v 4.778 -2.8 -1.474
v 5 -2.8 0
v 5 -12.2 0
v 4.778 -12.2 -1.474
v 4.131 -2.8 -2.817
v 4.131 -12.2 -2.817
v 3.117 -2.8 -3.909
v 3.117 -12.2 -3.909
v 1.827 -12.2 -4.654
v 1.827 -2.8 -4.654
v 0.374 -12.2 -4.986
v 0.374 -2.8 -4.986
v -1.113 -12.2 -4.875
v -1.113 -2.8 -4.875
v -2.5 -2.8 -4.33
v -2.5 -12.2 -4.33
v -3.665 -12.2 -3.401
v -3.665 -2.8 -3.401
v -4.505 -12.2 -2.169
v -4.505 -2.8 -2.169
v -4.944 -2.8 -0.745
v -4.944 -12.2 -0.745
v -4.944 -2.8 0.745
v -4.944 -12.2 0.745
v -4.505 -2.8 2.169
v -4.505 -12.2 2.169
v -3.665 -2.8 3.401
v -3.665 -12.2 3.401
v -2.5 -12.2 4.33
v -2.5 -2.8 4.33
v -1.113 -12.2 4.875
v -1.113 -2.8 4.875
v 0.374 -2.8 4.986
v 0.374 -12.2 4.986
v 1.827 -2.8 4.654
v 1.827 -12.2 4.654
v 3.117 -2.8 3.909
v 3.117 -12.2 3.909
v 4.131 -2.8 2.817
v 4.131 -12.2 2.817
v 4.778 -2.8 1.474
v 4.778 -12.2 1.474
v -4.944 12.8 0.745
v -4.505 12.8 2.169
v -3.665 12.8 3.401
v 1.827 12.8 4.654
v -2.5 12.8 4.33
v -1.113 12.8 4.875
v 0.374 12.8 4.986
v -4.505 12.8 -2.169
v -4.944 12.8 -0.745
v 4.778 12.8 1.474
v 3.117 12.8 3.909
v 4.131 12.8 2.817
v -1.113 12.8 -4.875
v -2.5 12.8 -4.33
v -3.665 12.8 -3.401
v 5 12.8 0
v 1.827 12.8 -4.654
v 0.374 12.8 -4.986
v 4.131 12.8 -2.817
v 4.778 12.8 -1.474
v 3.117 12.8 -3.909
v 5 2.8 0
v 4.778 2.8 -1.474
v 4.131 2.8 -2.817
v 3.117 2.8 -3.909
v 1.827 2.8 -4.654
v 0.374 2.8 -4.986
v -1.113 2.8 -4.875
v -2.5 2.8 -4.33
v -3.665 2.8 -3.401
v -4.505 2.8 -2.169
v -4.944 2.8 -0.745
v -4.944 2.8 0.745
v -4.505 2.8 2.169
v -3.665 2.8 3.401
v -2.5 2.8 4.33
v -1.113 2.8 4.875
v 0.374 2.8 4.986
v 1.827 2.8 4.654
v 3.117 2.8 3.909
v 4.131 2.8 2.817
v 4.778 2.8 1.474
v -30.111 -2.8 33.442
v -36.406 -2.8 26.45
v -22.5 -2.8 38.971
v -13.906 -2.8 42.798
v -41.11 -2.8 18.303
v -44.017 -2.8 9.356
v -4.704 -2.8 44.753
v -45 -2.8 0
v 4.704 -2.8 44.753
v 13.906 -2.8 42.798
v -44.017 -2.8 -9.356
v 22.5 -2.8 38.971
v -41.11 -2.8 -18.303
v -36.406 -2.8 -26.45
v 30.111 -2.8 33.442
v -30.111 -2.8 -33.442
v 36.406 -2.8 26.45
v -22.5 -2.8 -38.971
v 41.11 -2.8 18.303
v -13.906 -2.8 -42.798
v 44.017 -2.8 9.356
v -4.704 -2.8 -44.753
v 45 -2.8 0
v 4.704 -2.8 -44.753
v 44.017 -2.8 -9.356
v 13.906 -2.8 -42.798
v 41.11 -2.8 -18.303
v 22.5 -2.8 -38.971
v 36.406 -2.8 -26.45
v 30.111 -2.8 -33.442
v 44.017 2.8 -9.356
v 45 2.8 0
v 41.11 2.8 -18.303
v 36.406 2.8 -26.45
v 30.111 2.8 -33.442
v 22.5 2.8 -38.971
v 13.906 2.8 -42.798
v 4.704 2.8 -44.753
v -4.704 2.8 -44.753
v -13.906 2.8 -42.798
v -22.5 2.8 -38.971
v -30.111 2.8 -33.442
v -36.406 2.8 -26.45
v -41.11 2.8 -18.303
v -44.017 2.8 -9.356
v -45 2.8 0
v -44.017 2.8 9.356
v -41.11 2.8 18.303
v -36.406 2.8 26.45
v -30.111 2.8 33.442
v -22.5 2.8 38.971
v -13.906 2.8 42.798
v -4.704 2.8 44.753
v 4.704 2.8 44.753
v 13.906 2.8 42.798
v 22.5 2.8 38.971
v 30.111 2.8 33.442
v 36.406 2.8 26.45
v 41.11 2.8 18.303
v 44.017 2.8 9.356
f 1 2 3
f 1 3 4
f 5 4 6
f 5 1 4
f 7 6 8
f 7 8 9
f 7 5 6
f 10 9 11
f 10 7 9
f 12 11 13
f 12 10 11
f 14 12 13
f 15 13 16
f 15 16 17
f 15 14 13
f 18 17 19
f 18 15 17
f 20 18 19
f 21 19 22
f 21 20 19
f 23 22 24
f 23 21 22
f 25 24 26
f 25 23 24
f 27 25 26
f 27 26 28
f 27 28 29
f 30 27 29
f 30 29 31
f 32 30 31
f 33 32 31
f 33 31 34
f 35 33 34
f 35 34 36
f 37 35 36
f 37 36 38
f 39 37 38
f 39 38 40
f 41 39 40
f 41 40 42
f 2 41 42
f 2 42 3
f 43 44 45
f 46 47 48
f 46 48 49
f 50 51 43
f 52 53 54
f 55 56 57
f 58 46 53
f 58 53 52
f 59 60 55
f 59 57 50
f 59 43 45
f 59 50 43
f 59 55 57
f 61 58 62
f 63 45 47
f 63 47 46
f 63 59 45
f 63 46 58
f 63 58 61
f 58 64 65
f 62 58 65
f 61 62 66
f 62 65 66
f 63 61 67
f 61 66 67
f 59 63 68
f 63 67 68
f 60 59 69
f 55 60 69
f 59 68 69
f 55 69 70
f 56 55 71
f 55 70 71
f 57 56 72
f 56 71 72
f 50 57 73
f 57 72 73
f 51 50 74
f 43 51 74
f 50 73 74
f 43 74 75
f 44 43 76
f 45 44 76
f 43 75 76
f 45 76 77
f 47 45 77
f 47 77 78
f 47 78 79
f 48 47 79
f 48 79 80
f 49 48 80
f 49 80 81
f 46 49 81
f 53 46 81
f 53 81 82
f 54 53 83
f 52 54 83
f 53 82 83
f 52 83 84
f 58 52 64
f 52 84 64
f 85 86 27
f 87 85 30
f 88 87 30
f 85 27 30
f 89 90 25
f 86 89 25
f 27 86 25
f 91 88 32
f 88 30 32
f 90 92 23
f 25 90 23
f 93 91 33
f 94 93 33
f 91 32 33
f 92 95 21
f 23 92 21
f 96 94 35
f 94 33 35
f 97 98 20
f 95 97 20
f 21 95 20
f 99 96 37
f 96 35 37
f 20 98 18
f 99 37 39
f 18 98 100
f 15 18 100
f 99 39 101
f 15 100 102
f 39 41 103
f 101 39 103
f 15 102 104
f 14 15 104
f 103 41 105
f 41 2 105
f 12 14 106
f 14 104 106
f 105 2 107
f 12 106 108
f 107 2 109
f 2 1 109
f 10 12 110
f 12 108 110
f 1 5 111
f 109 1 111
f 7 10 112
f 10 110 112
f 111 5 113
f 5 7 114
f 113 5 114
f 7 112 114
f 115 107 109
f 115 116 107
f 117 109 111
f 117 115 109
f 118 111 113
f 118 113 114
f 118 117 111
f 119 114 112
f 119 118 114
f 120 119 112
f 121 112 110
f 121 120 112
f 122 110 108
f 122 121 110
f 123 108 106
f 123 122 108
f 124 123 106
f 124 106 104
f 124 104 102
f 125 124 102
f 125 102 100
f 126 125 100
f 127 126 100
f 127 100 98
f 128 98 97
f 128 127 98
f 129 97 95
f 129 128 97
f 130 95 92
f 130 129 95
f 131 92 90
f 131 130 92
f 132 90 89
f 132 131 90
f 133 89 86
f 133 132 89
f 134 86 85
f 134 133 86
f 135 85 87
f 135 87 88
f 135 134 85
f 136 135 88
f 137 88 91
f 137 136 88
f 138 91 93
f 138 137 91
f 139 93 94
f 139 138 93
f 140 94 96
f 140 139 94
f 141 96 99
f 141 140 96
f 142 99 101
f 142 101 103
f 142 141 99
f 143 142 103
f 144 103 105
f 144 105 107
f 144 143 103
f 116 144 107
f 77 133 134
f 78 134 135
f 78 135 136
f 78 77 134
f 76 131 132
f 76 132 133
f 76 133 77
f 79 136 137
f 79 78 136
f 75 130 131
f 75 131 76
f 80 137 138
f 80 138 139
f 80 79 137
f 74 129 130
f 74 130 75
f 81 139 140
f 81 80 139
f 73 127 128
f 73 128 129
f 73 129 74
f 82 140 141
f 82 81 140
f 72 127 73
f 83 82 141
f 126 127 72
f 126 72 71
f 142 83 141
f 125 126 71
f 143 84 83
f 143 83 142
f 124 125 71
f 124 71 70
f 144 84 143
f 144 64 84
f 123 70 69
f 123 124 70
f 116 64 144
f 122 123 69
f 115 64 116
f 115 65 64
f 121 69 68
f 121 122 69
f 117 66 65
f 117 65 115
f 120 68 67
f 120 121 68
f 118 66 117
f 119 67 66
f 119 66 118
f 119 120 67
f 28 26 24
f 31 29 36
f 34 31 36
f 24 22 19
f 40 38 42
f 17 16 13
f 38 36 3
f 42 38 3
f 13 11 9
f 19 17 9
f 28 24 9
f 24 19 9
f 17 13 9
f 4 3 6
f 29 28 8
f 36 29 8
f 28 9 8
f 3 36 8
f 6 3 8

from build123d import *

# Parameters (mm, degrees)
SKETCH1_R           = 45
BOSS_EXTRUDE1_DEPTH = 2.8
SKETCH3_R           = 5
BOSS_EXTRUDE2_DEPTH = 10
BOSS_EXTRUDE3_START = -15
SKETCH3_2_R         = 5
BOSS_EXTRUDE3_DEPTH = 15


with BuildPart() as part:
    # Sketch1 → Boss-Extrude1 (new, symmetric)
    with BuildSketch(Plane(origin=(0, 0, 0), x_dir=(1, 0, 0), z_dir=(0, 1, 0))):
        Circle(SKETCH1_R)
    extrude(amount=BOSS_EXTRUDE1_DEPTH, both=True)

    # Sketch3 → Boss-Extrude2 (add)
    with BuildSketch(Plane(origin=(0, 2.8, 0), x_dir=(1, 0, 0), z_dir=(0, 1, 0))):
        Circle(SKETCH3_R)
    extrude(amount=BOSS_EXTRUDE2_DEPTH)

    # Sketch3<2> → Boss-Extrude3 (add)
    with BuildSketch(Plane(origin=(0, 2.8, 0), x_dir=(1, 0, 0), z_dir=(0, 1, 0)).offset(BOSS_EXTRUDE3_START)):
        Circle(SKETCH3_2_R)
    extrude(amount=BOSS_EXTRUDE3_DEPTH)


solid = part.part
